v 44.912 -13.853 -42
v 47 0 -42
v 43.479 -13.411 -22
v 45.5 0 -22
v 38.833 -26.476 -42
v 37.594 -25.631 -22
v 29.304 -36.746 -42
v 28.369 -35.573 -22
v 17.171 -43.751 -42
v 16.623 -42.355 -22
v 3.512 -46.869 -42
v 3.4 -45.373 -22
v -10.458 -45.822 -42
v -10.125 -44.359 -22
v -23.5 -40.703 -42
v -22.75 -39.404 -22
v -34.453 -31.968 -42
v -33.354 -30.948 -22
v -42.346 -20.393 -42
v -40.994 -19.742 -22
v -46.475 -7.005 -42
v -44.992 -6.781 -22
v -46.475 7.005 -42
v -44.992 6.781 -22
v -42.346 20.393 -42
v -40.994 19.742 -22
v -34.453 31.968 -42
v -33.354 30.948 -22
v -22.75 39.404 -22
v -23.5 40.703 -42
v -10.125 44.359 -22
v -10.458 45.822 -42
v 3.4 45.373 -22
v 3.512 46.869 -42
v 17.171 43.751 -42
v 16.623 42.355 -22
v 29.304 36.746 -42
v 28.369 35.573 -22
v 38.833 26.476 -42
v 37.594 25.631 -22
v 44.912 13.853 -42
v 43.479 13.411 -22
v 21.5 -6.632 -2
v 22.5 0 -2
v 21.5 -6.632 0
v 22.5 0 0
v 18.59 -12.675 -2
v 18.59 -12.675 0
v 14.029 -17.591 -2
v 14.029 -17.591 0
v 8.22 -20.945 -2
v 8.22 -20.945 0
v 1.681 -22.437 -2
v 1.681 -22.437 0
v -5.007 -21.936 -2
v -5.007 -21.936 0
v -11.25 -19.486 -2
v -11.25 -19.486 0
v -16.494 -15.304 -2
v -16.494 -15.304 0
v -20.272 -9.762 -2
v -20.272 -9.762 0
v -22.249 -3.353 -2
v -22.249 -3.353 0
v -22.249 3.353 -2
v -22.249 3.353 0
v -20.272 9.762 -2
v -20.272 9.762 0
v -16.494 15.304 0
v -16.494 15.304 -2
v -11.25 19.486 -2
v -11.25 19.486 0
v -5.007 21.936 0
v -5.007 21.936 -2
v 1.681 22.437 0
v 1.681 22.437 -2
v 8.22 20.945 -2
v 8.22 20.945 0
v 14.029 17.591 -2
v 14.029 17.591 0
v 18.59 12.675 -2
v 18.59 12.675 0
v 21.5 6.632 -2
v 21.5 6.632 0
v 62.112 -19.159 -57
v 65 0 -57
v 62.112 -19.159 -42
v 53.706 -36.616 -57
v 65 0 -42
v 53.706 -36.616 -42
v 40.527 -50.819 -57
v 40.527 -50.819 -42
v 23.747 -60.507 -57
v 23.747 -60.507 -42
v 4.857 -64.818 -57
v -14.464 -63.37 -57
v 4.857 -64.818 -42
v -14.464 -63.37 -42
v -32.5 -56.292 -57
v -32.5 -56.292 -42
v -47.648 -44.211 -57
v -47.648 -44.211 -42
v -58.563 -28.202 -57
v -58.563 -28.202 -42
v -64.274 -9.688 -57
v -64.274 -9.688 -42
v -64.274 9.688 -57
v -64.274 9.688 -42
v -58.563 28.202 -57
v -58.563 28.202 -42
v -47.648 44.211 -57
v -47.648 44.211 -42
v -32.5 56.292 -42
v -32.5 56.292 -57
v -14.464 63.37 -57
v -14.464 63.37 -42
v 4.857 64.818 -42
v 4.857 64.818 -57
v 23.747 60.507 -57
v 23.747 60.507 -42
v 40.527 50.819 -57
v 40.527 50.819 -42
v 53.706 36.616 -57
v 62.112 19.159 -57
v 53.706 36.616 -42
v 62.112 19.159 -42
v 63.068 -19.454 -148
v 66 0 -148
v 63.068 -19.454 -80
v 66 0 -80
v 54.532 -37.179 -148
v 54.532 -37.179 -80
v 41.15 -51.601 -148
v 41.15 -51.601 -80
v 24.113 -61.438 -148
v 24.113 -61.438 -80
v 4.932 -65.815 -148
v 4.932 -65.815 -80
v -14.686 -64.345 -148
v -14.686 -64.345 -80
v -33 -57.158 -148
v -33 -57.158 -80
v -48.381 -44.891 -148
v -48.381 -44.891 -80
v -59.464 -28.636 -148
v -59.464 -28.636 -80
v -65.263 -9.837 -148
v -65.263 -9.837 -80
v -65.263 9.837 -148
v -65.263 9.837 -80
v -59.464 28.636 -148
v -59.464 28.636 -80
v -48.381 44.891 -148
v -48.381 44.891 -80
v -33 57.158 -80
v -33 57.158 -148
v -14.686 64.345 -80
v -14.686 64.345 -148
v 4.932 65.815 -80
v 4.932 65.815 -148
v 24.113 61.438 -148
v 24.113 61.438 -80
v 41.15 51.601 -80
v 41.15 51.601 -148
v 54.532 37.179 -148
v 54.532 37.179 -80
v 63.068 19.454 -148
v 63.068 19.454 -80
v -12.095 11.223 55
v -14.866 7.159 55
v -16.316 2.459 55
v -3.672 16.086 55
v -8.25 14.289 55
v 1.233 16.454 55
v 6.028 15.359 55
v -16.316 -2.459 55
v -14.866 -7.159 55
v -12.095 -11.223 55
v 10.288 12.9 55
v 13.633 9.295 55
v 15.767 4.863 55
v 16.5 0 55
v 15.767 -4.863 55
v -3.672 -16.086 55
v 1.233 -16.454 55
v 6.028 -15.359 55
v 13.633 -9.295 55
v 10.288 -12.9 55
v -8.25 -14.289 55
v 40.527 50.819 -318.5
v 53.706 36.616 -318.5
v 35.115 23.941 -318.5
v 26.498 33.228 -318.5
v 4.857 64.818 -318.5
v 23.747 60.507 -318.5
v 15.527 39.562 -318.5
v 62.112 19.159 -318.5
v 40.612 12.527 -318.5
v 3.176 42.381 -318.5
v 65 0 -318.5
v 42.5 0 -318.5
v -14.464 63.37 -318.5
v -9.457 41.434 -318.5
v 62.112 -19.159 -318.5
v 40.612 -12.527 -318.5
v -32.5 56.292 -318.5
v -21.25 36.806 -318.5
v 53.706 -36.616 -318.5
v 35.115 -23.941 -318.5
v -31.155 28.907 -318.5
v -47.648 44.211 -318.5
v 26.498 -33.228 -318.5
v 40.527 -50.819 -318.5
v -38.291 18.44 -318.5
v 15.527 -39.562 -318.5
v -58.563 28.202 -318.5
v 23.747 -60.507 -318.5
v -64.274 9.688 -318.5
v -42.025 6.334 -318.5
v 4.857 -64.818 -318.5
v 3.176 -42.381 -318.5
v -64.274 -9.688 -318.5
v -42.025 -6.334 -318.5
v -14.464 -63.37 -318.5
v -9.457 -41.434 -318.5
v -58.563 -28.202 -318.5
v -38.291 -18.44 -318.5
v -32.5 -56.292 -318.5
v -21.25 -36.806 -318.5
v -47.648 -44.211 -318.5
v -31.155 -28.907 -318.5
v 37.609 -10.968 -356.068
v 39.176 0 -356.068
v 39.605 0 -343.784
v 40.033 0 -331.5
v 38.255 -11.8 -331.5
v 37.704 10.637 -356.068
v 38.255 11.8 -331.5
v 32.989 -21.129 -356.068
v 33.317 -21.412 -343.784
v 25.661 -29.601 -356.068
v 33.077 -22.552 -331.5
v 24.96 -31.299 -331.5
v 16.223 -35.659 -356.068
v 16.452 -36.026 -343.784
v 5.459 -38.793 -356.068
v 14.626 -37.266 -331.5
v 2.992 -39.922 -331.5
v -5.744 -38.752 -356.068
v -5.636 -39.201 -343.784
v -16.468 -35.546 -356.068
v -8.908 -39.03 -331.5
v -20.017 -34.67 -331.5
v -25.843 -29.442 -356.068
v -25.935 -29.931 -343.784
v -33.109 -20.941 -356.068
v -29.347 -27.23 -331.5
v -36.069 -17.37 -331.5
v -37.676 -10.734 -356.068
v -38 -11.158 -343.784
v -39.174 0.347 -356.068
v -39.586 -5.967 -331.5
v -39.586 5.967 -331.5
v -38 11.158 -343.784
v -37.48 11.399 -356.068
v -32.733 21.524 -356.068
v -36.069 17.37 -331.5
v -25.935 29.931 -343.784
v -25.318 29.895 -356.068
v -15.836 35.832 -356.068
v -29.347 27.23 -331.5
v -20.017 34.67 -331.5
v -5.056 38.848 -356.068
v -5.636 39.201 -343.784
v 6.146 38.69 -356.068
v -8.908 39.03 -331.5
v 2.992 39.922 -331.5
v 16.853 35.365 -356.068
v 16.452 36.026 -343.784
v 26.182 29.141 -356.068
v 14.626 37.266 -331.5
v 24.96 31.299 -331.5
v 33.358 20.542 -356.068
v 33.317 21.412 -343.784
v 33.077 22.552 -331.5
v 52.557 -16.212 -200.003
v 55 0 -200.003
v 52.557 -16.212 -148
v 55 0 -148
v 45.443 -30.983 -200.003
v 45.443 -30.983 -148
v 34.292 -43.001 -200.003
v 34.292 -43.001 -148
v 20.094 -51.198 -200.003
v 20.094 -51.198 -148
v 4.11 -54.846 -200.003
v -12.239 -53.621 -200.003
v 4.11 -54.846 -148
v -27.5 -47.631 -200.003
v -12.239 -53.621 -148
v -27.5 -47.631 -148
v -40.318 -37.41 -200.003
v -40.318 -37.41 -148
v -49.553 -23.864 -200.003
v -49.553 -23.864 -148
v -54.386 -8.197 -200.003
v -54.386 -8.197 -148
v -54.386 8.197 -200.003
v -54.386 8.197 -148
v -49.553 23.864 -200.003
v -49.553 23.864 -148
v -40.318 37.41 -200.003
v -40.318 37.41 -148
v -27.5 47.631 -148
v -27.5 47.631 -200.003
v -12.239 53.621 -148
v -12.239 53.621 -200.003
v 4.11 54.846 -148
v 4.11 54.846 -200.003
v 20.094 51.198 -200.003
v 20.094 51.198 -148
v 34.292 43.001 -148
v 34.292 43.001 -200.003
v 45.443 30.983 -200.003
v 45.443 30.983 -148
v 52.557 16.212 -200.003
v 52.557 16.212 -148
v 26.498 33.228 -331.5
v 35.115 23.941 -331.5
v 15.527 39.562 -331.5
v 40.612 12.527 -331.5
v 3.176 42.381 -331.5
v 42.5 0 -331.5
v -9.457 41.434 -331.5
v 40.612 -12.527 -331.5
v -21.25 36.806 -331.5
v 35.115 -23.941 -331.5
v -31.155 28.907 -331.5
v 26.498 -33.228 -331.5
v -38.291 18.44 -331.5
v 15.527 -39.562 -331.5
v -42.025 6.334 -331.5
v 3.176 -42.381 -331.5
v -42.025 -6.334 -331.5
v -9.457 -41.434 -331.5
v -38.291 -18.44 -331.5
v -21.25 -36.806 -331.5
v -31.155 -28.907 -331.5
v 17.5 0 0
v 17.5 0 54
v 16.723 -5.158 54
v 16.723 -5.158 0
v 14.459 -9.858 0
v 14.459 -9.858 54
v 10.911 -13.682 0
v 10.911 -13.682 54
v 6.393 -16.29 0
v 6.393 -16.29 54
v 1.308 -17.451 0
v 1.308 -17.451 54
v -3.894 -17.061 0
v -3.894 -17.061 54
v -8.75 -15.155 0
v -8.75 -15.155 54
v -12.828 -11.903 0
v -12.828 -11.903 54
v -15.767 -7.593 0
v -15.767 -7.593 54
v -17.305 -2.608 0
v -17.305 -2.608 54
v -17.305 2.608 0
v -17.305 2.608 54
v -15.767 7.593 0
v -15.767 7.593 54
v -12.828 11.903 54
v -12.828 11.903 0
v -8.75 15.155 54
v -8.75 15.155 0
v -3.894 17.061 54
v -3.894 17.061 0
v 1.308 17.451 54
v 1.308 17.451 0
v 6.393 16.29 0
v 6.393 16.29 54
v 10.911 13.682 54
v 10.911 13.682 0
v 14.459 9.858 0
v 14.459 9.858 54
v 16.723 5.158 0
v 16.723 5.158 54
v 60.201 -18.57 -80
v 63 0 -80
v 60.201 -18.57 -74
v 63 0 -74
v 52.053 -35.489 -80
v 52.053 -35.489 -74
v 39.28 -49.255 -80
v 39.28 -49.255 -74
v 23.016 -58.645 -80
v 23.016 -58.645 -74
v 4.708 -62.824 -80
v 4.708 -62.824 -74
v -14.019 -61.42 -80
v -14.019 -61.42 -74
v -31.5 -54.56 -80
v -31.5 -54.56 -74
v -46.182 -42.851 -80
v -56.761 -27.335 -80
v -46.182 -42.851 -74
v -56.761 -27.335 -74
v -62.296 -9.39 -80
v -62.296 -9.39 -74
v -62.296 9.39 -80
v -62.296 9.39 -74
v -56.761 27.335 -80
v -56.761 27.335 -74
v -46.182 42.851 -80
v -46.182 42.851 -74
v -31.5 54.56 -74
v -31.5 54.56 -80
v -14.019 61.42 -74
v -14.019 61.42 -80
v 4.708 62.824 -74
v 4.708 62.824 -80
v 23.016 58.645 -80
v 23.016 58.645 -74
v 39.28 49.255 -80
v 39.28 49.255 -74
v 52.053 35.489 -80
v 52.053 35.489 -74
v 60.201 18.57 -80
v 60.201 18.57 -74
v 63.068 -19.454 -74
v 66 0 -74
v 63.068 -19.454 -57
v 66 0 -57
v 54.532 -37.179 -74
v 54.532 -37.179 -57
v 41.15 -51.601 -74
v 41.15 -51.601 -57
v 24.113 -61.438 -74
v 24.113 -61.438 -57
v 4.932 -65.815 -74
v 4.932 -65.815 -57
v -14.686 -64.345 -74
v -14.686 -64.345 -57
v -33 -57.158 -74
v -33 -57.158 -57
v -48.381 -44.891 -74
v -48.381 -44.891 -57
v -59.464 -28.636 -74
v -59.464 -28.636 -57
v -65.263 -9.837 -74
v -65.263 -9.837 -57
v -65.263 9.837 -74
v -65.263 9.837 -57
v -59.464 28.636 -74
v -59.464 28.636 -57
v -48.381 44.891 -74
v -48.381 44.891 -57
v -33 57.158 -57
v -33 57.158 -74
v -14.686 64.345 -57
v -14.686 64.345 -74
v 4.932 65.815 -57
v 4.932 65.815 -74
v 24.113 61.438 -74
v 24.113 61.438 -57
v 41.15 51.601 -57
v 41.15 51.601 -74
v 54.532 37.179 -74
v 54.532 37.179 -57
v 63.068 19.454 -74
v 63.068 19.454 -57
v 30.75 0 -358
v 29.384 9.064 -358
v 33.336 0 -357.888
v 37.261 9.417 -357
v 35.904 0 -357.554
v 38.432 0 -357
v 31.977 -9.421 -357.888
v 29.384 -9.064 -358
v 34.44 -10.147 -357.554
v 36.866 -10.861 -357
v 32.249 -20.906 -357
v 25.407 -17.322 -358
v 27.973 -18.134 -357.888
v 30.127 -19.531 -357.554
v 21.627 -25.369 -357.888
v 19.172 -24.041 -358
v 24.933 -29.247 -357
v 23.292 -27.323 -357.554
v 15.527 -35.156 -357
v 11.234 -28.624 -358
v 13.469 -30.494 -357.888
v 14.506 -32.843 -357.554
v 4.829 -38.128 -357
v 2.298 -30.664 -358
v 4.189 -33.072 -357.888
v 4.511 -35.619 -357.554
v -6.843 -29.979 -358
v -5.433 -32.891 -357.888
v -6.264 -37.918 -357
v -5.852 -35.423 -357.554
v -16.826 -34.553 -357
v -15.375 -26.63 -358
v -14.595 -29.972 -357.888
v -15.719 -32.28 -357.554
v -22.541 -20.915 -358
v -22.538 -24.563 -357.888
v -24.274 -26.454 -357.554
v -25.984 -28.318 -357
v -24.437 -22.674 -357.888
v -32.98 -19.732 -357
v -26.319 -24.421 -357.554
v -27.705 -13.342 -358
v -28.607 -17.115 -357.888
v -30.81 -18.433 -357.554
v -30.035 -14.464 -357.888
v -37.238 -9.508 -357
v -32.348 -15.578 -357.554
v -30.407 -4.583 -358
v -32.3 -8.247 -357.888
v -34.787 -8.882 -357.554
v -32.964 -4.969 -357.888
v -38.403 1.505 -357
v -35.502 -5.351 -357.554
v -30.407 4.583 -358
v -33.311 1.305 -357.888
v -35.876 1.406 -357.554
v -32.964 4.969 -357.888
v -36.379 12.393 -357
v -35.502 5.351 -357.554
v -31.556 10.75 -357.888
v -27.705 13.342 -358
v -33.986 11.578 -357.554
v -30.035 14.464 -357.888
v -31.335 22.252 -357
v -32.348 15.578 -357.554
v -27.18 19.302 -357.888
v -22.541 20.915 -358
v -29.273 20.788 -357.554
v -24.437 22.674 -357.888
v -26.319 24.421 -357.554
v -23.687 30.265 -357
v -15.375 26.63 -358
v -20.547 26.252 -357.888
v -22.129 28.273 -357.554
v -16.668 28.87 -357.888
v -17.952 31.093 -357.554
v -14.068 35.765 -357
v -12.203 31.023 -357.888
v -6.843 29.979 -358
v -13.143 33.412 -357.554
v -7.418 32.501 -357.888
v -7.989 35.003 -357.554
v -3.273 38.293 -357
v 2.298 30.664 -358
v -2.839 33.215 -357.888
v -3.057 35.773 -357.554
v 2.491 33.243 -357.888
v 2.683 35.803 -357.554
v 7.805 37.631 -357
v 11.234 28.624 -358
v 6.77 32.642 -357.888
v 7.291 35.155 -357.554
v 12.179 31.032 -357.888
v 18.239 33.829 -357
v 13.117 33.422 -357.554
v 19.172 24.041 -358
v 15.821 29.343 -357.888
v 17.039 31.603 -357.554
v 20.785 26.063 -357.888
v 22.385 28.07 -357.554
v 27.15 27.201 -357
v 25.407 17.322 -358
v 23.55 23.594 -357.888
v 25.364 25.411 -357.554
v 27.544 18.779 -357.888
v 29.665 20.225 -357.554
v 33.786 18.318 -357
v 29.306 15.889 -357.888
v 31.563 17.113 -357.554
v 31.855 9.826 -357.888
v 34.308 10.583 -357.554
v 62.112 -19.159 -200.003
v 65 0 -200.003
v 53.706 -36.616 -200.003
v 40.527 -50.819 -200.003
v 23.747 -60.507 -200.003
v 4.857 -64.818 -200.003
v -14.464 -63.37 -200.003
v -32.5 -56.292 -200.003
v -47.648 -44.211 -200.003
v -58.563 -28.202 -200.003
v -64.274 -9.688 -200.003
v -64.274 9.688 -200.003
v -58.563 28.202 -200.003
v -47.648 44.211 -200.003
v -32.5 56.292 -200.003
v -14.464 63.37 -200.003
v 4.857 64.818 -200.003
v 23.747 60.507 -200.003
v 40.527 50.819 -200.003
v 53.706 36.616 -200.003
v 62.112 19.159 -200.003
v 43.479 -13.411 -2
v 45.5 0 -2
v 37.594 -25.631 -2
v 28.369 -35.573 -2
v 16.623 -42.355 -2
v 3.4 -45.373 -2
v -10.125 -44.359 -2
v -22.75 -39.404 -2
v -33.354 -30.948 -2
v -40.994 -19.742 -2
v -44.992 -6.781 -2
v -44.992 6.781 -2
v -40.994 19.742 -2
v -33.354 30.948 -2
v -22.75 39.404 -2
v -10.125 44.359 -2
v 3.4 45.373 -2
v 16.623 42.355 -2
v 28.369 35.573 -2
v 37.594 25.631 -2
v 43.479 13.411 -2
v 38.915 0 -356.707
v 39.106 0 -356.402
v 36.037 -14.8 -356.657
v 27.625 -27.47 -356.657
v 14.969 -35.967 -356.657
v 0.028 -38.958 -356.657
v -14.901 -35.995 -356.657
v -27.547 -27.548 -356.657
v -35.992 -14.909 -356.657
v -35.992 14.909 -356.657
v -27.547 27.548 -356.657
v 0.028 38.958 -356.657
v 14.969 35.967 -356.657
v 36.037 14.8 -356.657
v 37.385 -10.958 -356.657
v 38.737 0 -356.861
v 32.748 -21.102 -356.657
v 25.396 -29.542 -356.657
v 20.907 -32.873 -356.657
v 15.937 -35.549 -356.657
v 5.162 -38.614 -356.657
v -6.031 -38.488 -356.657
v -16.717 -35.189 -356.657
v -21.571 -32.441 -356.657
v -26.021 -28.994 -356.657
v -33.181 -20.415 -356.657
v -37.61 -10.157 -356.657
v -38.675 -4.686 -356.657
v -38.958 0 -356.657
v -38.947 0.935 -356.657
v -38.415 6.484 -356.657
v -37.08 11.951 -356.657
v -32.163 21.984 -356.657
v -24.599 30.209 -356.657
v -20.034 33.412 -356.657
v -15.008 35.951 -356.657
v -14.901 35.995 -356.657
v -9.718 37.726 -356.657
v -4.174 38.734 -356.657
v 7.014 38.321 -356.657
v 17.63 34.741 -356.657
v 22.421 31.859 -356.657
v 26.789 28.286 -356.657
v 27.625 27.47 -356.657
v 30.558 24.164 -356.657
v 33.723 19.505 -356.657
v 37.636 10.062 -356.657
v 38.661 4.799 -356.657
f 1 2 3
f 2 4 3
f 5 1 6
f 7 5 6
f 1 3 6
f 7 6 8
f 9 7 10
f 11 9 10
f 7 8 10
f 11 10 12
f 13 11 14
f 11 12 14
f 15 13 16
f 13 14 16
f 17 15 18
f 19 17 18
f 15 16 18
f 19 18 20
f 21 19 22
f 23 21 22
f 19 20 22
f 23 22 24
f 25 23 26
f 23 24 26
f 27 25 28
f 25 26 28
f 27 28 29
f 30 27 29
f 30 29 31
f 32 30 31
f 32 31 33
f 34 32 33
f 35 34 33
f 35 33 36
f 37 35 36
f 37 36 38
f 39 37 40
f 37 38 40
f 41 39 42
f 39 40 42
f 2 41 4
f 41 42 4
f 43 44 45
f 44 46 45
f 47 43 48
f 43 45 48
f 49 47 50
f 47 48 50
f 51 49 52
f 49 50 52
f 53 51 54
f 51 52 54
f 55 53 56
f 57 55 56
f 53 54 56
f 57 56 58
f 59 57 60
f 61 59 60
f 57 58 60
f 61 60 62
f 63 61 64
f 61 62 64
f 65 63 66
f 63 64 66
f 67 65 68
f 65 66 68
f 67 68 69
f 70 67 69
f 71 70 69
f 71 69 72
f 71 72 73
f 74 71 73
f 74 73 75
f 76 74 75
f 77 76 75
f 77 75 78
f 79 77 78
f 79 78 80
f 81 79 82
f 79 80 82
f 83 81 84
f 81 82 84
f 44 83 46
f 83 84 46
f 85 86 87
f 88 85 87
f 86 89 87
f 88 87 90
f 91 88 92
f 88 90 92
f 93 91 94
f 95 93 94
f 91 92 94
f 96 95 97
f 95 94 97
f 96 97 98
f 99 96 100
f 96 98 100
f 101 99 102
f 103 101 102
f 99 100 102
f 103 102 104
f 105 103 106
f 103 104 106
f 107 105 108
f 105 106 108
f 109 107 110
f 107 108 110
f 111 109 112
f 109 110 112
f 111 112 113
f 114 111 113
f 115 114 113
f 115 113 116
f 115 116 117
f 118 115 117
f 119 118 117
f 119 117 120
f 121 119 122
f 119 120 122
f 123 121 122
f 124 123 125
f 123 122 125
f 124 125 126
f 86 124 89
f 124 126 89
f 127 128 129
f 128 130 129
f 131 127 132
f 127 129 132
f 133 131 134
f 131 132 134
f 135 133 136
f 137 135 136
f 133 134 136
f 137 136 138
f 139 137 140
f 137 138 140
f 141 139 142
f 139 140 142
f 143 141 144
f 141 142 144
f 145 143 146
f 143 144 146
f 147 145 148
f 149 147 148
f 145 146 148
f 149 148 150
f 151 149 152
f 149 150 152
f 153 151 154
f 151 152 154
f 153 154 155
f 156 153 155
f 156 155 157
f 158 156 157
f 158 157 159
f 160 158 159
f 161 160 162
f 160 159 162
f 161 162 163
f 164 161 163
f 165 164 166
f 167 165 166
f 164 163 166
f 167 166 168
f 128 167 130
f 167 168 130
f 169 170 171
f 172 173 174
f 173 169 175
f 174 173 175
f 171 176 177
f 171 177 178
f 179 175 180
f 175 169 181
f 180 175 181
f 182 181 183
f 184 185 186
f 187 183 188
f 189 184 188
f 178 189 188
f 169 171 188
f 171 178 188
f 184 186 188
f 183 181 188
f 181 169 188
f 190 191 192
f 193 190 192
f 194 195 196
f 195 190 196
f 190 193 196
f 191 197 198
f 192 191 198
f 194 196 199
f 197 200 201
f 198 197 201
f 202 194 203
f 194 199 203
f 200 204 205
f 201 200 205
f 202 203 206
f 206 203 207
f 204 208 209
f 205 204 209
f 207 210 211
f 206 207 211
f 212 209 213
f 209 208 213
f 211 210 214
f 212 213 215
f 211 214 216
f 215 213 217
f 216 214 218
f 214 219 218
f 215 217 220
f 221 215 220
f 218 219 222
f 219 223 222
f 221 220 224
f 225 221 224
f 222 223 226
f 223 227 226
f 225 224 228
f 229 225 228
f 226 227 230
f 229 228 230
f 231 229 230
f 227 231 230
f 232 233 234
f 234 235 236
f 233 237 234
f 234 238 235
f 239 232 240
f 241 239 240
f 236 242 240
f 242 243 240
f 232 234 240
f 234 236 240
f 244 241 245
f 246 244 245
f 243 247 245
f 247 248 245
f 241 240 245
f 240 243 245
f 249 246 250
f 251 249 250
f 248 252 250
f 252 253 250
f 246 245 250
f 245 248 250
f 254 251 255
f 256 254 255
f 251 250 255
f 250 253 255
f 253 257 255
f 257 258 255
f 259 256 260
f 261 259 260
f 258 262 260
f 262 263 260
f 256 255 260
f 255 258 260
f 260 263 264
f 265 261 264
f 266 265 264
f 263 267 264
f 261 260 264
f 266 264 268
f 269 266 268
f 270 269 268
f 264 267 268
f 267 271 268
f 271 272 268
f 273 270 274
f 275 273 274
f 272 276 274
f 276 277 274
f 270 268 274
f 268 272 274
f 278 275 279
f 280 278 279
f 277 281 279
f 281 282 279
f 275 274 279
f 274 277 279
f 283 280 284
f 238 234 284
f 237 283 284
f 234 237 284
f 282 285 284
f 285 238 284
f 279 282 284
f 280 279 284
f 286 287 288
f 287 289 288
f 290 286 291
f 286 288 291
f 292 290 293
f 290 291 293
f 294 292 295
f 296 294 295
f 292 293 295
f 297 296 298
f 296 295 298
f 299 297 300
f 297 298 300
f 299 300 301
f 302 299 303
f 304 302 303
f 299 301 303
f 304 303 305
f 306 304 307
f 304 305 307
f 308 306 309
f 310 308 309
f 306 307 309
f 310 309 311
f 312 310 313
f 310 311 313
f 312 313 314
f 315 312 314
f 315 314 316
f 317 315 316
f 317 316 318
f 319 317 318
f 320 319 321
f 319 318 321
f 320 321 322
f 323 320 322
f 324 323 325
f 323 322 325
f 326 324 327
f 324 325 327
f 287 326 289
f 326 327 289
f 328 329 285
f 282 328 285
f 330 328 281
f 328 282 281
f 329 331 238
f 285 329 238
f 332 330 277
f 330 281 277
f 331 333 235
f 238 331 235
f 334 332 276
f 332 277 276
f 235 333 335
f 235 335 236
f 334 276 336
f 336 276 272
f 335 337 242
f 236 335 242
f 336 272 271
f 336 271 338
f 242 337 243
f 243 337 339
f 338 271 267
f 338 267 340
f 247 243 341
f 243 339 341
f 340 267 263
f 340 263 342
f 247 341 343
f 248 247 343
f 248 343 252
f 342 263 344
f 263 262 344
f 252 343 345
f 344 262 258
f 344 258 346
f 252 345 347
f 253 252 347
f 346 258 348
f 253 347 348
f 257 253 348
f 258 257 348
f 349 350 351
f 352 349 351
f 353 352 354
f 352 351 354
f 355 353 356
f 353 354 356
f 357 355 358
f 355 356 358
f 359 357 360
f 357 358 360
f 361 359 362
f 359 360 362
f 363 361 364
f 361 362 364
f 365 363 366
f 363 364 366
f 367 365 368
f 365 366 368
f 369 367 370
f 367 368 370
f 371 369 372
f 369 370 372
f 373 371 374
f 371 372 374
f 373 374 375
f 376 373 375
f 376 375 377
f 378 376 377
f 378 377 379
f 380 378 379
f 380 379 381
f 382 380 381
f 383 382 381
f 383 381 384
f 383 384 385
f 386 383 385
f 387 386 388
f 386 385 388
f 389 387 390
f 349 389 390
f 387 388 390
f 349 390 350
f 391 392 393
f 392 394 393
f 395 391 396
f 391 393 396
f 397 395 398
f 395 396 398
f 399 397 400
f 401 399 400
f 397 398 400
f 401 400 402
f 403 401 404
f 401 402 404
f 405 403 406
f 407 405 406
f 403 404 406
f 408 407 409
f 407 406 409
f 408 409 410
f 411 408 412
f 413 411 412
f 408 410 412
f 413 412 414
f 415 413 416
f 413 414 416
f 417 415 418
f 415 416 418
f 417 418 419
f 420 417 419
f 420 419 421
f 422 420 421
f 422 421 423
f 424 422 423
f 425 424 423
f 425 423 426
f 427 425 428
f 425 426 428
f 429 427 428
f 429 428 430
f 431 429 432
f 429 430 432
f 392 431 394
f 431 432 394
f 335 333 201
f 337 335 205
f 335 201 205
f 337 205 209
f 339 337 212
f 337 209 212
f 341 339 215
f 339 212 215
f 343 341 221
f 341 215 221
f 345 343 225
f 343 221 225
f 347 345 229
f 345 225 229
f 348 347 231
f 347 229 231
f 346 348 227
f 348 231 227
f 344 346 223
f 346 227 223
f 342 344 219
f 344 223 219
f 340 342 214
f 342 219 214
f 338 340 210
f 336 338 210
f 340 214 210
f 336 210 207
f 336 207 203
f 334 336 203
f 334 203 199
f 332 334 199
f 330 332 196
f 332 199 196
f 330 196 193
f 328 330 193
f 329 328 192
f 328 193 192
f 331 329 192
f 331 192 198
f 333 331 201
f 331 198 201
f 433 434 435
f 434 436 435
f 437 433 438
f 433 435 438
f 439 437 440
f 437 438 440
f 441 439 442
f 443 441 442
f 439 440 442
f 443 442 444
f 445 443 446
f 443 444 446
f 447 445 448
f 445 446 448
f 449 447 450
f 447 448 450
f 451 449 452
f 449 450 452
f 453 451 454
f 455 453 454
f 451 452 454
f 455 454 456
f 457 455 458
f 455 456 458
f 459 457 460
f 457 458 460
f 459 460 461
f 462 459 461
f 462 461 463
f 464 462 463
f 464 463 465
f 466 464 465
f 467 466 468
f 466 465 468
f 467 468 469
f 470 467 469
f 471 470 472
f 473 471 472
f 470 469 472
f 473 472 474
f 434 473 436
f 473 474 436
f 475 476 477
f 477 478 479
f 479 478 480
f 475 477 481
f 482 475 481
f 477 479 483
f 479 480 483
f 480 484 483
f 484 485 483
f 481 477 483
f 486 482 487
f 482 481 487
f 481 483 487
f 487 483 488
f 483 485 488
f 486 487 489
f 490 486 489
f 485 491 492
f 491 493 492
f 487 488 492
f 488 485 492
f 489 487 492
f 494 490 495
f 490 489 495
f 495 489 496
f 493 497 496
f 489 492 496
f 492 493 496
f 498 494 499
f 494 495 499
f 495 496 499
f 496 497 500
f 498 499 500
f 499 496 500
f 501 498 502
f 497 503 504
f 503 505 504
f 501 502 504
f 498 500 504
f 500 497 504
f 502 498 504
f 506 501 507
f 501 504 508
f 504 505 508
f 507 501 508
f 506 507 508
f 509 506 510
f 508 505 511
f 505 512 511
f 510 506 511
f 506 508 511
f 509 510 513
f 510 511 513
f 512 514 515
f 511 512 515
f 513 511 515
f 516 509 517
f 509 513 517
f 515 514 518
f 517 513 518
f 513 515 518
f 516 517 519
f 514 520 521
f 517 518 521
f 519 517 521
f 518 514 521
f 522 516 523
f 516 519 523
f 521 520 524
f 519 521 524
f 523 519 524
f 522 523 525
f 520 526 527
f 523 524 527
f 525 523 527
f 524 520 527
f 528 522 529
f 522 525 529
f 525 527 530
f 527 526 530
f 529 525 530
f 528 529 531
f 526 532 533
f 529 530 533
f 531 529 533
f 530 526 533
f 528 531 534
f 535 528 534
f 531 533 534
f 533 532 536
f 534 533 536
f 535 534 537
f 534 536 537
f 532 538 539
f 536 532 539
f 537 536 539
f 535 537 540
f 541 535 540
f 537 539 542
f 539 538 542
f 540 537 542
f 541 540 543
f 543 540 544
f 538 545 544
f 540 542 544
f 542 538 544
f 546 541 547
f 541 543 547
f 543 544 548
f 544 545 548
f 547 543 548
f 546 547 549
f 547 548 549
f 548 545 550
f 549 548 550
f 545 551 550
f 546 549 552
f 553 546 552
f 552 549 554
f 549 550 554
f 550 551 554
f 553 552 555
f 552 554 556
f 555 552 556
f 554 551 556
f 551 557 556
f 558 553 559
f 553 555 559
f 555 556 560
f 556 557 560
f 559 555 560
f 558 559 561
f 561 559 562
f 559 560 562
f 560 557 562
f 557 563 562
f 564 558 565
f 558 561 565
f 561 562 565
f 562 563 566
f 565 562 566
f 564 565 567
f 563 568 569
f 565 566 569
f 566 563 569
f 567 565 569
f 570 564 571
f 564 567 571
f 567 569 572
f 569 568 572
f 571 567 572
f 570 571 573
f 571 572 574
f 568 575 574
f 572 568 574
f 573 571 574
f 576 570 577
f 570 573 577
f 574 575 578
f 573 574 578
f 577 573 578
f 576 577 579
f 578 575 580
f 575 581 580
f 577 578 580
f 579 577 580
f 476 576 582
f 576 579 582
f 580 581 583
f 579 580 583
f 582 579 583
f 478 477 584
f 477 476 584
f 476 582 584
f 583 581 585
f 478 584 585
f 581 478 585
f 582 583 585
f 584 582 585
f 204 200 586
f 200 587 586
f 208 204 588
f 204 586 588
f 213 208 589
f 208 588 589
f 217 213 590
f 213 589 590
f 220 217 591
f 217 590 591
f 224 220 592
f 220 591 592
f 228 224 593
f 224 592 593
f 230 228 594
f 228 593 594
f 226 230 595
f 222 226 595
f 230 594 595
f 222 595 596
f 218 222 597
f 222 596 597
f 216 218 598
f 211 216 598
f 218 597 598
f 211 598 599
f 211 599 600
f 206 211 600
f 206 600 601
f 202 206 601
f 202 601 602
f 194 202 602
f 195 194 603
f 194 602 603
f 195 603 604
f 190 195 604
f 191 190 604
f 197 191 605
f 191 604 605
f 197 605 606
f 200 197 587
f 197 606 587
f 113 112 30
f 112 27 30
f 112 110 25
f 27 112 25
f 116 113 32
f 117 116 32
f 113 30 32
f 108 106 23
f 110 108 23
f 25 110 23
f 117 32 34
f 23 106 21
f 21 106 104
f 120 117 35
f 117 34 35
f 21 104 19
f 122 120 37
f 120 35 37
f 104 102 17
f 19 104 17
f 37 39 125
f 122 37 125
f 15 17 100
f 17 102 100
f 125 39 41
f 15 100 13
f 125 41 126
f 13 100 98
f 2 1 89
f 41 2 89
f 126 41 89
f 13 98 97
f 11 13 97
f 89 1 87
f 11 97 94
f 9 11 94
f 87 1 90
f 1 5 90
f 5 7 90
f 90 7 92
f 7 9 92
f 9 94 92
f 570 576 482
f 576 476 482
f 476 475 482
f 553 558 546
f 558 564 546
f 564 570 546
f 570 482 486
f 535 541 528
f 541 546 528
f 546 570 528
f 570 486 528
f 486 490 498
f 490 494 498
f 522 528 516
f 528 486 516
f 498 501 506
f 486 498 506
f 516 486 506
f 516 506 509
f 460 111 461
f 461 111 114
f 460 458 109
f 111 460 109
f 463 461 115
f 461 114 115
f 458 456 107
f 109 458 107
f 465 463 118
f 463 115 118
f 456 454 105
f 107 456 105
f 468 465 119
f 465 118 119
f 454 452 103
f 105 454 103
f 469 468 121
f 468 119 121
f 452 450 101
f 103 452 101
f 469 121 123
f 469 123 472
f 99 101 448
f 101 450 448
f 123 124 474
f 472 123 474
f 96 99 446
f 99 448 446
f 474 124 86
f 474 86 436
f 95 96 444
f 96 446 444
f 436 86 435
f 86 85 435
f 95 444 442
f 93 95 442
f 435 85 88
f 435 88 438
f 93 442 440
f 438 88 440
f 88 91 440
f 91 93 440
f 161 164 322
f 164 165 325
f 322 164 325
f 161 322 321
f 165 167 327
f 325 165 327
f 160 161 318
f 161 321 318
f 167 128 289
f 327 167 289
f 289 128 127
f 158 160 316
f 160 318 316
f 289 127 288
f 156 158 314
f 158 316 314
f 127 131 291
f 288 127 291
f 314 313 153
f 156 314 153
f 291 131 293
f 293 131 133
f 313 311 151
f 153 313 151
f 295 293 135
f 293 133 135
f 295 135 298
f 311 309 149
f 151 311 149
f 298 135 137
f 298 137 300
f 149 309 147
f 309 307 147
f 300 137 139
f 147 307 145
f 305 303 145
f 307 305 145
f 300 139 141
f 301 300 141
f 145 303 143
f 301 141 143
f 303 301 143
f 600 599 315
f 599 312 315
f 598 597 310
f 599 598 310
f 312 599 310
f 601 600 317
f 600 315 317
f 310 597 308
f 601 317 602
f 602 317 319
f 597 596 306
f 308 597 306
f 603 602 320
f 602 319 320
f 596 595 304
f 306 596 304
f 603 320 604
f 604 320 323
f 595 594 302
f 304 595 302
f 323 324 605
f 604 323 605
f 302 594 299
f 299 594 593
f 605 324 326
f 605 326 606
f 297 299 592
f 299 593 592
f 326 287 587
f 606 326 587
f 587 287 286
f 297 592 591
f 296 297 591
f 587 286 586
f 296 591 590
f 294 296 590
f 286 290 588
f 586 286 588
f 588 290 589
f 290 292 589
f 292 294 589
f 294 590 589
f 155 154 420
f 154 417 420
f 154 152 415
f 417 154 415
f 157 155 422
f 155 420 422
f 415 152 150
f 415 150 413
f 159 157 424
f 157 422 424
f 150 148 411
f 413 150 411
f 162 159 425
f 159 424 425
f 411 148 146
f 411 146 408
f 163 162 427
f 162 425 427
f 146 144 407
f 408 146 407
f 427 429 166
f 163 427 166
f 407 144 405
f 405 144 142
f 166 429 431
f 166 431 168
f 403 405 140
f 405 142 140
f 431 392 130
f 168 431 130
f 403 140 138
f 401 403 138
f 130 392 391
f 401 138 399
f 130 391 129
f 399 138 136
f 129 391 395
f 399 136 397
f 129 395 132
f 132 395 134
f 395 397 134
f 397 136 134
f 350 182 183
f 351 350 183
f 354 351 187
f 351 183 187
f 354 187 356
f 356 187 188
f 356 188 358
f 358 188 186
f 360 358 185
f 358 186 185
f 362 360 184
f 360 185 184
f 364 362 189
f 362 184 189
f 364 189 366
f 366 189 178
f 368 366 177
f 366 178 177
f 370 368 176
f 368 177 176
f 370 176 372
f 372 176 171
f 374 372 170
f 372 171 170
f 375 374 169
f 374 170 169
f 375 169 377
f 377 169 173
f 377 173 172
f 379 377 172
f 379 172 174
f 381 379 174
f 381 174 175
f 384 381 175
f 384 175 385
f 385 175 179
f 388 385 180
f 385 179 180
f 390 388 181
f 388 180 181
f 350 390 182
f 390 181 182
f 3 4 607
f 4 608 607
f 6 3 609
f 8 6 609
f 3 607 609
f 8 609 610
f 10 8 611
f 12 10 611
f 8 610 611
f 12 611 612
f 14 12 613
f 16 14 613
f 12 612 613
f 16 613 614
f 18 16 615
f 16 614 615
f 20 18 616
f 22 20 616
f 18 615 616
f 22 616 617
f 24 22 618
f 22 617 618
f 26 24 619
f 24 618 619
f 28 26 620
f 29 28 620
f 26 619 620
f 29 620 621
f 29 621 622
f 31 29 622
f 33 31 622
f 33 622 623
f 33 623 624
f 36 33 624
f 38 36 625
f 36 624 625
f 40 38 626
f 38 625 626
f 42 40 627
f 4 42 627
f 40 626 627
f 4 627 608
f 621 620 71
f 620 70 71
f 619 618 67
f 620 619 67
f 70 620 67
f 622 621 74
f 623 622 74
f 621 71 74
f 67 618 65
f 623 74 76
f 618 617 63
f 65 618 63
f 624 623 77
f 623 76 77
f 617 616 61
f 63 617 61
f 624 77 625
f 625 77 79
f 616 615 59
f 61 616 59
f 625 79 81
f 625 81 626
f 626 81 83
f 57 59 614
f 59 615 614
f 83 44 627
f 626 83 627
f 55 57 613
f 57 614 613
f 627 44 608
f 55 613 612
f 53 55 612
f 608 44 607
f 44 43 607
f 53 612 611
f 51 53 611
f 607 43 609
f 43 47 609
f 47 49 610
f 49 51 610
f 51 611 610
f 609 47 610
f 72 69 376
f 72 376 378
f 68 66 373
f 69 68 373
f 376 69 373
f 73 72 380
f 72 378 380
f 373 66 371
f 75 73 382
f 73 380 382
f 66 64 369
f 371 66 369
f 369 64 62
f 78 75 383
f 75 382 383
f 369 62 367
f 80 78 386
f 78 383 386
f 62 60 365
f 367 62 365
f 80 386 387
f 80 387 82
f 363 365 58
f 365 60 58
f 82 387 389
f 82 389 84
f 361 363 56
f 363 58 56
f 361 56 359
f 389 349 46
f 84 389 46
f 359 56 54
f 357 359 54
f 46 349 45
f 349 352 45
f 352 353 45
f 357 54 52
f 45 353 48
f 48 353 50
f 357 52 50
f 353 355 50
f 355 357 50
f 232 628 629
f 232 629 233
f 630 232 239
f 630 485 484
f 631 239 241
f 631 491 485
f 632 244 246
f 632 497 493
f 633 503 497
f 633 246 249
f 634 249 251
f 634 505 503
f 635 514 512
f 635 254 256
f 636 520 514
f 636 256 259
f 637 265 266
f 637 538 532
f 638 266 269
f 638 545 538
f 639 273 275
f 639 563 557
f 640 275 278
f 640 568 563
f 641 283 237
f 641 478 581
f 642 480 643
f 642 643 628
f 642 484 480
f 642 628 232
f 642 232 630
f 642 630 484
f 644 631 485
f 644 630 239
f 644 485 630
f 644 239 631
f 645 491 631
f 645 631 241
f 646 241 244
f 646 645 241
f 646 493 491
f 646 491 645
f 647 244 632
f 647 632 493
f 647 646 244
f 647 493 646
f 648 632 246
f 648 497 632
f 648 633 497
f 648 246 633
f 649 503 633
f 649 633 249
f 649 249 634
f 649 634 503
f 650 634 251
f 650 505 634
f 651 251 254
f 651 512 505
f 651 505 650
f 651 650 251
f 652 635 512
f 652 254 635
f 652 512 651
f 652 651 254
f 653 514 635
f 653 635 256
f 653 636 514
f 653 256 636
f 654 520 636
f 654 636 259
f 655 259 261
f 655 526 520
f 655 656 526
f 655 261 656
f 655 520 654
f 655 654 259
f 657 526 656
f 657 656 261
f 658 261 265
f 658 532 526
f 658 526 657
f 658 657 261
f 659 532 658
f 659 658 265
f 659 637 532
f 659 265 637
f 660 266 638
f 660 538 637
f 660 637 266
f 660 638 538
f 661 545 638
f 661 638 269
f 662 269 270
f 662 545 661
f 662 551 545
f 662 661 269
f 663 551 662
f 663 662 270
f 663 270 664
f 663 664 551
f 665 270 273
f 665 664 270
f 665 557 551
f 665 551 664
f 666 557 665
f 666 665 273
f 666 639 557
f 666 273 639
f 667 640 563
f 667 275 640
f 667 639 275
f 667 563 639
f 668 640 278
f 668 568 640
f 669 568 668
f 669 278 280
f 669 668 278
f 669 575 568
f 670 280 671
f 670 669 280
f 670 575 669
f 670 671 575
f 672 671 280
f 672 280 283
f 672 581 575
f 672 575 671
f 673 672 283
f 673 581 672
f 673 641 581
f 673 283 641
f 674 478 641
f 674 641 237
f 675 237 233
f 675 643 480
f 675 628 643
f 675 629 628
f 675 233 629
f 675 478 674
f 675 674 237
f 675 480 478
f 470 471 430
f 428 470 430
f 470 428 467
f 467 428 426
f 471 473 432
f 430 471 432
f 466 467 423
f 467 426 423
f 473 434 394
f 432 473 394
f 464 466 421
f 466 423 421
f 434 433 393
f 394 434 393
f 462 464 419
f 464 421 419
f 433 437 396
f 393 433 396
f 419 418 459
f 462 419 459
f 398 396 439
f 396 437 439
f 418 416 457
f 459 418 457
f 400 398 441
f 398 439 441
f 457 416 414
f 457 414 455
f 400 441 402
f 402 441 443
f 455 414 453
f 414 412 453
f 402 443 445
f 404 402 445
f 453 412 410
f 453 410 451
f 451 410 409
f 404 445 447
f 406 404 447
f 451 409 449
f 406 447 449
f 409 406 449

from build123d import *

# Parameters (mm, degrees)
FILLET1_R     = 1
CHAMFER1_SIZE = 1


with BuildPart() as part:
    # Sketch1 → Revolve1 (revolve)
    with BuildSketch(Plane(origin=(0, 0, 0), x_dir=(0, 0, -1), z_dir=(1, 0, 0)), mode=Mode.PRIVATE) as revolve1_sk:
        with BuildLine():
            Line((-55, 0), (358, 0))
            Line((358, 0), (358, 30.75))
            ThreePointArc((358, 30.75), (357.69848481, 34.992640687), (356.8, 39.15))
            Line((356.8, 39.15), (331.5, 40.033495468))
            Line((331.5, 40.033495468), (331.5, 42.5))
            Line((331.5, 42.5), (318.5, 42.5))
            Line((318.5, 42.5), (318.5, 65))
            Line((318.5, 65), (200.002907484, 65))
            Line((200.002907484, 65), (200.002907484, 55))
            Line((200.002907484, 55), (148, 55))
            Line((148, 55), (148, 66))
            Line((148, 66), (80, 66))
            Line((80, 66), (80, 63))
            Line((80, 63), (74, 63))
            Line((74, 63), (74, 66))
            Line((74, 66), (57, 66))
            Line((57, 66), (57, 65))
            Line((57, 65), (42, 65))
            Line((42, 65), (42, 47))
            Line((42, 47), (22, 45.5))
            Line((22, 45.5), (2, 45.5))
            Line((2, 45.5), (2, 22.5))
            Line((2, 22.5), (0, 22.5))
            Line((0, 22.5), (0, 17.5))
            Line((0, 17.5), (-55, 17.5))
            Line((-55, 17.5), (-55, 0))
        make_face()
    revolve(revolve1_sk.sketch.rotate(Axis((0, 0, 61.708002771), (0, 0, -1)), 90), axis=Axis((0, 0, 61.708002771), (0, 0, -1)))

    # Fillet1
    fillet1_edges = [part.edges().sort_by_distance(p)[0] for p in [
        (-39.15, 0, -356.8),
    ]]
    fillet(fillet1_edges, radius=FILLET1_R)

    # Chamfer1
    chamfer1_edges = [part.edges().sort_by_distance(p)[0] for p in [
        (-17.5, 0, 55),
    ]]
    chamfer(chamfer1_edges, length=CHAMFER1_SIZE)


solid = part.part
